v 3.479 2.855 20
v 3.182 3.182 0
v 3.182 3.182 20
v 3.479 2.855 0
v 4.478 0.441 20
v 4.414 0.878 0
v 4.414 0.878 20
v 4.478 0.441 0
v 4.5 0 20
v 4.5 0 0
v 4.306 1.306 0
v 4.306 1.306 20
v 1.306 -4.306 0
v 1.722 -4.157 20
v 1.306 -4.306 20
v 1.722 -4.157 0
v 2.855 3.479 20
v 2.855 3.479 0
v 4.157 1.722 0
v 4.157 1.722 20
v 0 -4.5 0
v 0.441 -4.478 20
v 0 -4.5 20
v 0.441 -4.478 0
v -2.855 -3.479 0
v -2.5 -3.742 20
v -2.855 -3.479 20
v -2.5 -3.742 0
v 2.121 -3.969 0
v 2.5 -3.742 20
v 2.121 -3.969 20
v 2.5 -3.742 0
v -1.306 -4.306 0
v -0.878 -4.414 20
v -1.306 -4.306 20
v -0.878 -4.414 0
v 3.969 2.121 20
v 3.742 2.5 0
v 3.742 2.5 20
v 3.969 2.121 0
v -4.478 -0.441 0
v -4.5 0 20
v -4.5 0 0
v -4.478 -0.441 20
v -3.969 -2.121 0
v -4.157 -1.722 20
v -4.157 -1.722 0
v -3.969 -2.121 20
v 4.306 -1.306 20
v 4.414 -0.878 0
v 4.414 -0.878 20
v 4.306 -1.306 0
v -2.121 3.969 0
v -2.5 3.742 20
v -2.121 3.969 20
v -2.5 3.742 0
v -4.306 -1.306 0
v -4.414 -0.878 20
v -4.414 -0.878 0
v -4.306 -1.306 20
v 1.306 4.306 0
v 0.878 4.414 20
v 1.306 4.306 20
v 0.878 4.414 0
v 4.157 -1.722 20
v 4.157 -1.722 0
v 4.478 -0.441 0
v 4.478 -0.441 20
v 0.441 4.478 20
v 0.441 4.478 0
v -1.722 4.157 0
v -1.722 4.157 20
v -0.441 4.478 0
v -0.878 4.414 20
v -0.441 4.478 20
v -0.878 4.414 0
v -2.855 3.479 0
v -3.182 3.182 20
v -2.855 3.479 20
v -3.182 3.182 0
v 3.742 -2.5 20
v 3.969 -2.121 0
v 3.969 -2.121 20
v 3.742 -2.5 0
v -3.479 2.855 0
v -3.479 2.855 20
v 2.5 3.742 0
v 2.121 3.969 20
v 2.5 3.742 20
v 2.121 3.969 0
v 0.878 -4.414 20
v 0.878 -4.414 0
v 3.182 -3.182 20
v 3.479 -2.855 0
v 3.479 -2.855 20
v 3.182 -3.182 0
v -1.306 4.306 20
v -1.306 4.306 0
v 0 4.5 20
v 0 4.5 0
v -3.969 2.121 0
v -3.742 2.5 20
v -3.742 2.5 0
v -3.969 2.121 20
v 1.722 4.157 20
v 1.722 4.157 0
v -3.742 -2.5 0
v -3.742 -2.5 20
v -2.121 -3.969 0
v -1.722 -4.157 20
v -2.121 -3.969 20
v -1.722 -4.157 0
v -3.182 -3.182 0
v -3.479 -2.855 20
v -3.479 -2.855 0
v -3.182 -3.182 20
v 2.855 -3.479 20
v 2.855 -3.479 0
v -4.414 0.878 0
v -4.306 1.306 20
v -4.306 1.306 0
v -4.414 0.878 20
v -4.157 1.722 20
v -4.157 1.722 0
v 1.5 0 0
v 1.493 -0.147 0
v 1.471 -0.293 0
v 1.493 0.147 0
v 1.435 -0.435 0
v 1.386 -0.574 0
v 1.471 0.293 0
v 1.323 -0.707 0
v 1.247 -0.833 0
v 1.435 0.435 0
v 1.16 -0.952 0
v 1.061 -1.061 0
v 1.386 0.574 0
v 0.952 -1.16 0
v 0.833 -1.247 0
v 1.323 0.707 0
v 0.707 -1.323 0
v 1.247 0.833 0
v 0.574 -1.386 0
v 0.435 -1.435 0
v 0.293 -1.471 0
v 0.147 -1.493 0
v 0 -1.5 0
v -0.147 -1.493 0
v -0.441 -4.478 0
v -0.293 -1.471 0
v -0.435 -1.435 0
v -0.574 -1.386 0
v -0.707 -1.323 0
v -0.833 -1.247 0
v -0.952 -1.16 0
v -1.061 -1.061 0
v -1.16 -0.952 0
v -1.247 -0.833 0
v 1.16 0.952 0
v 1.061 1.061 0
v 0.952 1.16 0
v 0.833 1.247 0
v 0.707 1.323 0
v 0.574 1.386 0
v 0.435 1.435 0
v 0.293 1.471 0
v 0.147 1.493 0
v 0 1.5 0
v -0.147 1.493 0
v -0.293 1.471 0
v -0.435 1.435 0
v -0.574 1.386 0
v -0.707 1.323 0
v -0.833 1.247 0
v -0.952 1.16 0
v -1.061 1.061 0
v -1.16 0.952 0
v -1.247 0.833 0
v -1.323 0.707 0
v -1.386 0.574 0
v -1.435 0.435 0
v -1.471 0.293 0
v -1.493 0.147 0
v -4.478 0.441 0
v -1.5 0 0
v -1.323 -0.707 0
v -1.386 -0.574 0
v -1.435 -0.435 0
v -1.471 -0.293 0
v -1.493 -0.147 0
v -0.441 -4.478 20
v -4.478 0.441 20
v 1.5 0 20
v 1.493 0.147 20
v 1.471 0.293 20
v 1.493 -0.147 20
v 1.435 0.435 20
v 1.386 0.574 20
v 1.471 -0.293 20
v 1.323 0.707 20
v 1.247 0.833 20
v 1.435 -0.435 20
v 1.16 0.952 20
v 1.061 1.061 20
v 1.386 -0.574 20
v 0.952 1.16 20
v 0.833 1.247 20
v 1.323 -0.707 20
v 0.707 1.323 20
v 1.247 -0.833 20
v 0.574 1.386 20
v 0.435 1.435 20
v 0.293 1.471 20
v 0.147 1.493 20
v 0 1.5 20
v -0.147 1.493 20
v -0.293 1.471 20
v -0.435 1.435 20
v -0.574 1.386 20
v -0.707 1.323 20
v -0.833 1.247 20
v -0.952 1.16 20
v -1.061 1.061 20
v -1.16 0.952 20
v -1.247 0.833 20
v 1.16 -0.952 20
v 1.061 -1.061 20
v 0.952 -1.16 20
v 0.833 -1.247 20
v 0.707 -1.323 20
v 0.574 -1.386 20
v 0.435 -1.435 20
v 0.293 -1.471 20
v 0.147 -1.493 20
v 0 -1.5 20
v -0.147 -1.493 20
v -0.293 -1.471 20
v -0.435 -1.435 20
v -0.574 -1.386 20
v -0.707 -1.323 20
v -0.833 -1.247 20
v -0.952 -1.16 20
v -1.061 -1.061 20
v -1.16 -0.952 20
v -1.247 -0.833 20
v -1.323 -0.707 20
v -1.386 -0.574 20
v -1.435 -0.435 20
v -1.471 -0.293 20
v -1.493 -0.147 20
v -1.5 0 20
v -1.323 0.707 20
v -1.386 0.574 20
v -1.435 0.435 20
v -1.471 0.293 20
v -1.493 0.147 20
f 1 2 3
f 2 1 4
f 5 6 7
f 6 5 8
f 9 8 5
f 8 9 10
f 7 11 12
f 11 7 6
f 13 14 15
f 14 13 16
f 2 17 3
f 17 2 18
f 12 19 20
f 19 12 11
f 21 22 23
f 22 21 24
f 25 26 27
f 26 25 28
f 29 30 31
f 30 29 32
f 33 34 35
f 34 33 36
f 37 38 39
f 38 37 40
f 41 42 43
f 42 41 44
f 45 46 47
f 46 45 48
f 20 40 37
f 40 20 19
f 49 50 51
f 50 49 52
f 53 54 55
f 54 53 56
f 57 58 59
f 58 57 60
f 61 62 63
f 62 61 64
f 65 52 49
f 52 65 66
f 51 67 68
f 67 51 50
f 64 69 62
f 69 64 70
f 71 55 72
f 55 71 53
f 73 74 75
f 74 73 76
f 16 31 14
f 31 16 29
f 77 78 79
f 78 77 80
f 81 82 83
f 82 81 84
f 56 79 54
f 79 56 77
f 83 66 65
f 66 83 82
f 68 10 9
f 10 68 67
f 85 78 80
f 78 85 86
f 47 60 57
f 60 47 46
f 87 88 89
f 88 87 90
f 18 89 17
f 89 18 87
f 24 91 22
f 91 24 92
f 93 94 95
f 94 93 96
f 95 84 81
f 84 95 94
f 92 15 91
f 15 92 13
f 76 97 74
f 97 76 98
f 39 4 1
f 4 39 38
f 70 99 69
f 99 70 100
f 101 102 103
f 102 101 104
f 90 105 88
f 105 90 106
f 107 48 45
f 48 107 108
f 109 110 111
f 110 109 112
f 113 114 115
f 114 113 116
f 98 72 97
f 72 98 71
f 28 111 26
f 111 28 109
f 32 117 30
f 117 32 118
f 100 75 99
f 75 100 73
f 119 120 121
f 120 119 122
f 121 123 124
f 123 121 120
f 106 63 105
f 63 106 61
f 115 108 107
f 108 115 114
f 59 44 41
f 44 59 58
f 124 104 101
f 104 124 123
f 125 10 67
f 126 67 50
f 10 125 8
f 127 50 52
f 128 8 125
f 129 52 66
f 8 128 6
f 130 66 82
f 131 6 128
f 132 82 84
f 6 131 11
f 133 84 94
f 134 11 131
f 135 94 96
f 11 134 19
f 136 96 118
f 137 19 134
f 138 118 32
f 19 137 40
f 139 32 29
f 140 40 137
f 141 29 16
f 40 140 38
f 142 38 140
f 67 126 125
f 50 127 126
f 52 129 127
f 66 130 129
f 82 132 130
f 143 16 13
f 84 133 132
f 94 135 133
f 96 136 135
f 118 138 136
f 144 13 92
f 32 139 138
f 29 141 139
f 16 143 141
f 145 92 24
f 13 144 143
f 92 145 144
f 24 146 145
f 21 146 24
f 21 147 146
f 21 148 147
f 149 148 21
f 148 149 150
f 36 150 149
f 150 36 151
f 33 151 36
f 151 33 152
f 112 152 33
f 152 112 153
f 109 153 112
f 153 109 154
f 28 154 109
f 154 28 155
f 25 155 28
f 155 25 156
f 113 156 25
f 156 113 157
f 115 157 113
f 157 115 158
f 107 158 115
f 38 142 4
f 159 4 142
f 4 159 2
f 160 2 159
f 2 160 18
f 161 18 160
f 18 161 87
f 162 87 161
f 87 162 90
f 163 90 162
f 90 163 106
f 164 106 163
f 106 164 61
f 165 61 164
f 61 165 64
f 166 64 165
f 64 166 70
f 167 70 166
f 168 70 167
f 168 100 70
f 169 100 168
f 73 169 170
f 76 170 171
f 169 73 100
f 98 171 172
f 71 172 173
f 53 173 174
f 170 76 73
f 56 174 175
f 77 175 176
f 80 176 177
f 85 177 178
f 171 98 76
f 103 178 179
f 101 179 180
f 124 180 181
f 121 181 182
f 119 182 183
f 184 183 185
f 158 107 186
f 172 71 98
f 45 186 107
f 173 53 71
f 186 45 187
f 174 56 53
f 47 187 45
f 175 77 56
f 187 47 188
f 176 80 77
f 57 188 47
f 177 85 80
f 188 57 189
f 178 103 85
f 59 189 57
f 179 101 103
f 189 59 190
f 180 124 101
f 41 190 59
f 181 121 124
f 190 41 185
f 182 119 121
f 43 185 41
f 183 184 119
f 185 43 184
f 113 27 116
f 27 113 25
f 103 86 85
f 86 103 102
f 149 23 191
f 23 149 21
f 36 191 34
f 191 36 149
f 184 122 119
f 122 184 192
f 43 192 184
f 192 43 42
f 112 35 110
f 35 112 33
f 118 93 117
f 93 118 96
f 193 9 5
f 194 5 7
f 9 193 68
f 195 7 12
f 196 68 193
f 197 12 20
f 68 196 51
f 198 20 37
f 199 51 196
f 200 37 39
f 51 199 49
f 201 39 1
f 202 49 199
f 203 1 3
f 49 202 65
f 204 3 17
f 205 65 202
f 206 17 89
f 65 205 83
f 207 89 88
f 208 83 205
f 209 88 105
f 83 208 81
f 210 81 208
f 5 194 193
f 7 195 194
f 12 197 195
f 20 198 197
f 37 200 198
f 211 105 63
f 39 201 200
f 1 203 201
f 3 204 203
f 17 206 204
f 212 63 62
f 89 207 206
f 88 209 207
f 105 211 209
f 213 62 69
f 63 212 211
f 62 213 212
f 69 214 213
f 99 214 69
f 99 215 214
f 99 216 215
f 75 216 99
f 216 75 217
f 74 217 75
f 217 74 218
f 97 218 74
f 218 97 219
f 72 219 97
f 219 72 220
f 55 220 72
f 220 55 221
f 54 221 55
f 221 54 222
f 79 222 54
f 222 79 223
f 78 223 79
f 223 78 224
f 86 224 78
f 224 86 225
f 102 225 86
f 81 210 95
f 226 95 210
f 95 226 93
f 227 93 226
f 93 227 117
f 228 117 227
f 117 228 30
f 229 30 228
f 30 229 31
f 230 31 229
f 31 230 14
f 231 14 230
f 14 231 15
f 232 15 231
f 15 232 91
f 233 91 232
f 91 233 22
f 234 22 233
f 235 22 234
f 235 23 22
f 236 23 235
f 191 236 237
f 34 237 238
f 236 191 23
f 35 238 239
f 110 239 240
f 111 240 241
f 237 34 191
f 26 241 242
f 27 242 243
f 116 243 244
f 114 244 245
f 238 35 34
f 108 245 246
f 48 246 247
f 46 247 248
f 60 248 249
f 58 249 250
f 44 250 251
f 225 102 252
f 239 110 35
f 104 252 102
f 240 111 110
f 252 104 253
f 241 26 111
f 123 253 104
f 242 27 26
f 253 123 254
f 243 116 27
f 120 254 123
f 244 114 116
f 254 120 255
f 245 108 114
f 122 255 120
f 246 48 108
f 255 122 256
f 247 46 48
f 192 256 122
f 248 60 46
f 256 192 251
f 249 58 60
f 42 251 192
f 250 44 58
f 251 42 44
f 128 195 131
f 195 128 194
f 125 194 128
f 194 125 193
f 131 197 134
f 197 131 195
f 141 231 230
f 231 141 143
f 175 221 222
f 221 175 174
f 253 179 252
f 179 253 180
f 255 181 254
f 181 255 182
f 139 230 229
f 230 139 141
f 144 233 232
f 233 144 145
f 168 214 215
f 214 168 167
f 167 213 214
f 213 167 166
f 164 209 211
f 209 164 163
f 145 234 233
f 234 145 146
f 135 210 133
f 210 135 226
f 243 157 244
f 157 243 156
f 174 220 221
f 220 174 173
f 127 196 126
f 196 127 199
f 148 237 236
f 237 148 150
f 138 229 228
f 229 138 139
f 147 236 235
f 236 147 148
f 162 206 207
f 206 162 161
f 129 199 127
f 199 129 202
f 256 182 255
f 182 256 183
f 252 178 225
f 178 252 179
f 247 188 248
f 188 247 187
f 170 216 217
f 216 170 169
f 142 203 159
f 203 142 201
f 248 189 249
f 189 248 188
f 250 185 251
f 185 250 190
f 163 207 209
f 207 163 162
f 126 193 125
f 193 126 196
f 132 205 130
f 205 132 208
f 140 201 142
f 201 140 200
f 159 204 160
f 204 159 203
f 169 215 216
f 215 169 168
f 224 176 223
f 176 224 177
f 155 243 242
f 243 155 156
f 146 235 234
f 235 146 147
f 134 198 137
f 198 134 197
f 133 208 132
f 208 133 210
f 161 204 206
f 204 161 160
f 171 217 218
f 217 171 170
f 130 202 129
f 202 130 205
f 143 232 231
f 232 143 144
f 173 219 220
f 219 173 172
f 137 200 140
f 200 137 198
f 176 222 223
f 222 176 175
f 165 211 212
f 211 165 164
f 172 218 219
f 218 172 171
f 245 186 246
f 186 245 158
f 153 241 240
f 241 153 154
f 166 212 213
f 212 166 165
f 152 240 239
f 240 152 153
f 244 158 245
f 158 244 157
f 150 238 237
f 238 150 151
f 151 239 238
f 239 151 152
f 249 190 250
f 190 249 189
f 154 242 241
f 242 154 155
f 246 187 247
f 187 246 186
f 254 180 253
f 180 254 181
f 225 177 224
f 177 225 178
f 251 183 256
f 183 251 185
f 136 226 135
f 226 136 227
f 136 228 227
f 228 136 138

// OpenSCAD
module standoff_pillar() {
    difference() {
        cylinder(h=20.0, d=9.0, $fn=64);
        translate([0, 0, -1])
            cylinder(h=22.0, d=3.0, $fn=64);
    }
}

standoff_pillar();
